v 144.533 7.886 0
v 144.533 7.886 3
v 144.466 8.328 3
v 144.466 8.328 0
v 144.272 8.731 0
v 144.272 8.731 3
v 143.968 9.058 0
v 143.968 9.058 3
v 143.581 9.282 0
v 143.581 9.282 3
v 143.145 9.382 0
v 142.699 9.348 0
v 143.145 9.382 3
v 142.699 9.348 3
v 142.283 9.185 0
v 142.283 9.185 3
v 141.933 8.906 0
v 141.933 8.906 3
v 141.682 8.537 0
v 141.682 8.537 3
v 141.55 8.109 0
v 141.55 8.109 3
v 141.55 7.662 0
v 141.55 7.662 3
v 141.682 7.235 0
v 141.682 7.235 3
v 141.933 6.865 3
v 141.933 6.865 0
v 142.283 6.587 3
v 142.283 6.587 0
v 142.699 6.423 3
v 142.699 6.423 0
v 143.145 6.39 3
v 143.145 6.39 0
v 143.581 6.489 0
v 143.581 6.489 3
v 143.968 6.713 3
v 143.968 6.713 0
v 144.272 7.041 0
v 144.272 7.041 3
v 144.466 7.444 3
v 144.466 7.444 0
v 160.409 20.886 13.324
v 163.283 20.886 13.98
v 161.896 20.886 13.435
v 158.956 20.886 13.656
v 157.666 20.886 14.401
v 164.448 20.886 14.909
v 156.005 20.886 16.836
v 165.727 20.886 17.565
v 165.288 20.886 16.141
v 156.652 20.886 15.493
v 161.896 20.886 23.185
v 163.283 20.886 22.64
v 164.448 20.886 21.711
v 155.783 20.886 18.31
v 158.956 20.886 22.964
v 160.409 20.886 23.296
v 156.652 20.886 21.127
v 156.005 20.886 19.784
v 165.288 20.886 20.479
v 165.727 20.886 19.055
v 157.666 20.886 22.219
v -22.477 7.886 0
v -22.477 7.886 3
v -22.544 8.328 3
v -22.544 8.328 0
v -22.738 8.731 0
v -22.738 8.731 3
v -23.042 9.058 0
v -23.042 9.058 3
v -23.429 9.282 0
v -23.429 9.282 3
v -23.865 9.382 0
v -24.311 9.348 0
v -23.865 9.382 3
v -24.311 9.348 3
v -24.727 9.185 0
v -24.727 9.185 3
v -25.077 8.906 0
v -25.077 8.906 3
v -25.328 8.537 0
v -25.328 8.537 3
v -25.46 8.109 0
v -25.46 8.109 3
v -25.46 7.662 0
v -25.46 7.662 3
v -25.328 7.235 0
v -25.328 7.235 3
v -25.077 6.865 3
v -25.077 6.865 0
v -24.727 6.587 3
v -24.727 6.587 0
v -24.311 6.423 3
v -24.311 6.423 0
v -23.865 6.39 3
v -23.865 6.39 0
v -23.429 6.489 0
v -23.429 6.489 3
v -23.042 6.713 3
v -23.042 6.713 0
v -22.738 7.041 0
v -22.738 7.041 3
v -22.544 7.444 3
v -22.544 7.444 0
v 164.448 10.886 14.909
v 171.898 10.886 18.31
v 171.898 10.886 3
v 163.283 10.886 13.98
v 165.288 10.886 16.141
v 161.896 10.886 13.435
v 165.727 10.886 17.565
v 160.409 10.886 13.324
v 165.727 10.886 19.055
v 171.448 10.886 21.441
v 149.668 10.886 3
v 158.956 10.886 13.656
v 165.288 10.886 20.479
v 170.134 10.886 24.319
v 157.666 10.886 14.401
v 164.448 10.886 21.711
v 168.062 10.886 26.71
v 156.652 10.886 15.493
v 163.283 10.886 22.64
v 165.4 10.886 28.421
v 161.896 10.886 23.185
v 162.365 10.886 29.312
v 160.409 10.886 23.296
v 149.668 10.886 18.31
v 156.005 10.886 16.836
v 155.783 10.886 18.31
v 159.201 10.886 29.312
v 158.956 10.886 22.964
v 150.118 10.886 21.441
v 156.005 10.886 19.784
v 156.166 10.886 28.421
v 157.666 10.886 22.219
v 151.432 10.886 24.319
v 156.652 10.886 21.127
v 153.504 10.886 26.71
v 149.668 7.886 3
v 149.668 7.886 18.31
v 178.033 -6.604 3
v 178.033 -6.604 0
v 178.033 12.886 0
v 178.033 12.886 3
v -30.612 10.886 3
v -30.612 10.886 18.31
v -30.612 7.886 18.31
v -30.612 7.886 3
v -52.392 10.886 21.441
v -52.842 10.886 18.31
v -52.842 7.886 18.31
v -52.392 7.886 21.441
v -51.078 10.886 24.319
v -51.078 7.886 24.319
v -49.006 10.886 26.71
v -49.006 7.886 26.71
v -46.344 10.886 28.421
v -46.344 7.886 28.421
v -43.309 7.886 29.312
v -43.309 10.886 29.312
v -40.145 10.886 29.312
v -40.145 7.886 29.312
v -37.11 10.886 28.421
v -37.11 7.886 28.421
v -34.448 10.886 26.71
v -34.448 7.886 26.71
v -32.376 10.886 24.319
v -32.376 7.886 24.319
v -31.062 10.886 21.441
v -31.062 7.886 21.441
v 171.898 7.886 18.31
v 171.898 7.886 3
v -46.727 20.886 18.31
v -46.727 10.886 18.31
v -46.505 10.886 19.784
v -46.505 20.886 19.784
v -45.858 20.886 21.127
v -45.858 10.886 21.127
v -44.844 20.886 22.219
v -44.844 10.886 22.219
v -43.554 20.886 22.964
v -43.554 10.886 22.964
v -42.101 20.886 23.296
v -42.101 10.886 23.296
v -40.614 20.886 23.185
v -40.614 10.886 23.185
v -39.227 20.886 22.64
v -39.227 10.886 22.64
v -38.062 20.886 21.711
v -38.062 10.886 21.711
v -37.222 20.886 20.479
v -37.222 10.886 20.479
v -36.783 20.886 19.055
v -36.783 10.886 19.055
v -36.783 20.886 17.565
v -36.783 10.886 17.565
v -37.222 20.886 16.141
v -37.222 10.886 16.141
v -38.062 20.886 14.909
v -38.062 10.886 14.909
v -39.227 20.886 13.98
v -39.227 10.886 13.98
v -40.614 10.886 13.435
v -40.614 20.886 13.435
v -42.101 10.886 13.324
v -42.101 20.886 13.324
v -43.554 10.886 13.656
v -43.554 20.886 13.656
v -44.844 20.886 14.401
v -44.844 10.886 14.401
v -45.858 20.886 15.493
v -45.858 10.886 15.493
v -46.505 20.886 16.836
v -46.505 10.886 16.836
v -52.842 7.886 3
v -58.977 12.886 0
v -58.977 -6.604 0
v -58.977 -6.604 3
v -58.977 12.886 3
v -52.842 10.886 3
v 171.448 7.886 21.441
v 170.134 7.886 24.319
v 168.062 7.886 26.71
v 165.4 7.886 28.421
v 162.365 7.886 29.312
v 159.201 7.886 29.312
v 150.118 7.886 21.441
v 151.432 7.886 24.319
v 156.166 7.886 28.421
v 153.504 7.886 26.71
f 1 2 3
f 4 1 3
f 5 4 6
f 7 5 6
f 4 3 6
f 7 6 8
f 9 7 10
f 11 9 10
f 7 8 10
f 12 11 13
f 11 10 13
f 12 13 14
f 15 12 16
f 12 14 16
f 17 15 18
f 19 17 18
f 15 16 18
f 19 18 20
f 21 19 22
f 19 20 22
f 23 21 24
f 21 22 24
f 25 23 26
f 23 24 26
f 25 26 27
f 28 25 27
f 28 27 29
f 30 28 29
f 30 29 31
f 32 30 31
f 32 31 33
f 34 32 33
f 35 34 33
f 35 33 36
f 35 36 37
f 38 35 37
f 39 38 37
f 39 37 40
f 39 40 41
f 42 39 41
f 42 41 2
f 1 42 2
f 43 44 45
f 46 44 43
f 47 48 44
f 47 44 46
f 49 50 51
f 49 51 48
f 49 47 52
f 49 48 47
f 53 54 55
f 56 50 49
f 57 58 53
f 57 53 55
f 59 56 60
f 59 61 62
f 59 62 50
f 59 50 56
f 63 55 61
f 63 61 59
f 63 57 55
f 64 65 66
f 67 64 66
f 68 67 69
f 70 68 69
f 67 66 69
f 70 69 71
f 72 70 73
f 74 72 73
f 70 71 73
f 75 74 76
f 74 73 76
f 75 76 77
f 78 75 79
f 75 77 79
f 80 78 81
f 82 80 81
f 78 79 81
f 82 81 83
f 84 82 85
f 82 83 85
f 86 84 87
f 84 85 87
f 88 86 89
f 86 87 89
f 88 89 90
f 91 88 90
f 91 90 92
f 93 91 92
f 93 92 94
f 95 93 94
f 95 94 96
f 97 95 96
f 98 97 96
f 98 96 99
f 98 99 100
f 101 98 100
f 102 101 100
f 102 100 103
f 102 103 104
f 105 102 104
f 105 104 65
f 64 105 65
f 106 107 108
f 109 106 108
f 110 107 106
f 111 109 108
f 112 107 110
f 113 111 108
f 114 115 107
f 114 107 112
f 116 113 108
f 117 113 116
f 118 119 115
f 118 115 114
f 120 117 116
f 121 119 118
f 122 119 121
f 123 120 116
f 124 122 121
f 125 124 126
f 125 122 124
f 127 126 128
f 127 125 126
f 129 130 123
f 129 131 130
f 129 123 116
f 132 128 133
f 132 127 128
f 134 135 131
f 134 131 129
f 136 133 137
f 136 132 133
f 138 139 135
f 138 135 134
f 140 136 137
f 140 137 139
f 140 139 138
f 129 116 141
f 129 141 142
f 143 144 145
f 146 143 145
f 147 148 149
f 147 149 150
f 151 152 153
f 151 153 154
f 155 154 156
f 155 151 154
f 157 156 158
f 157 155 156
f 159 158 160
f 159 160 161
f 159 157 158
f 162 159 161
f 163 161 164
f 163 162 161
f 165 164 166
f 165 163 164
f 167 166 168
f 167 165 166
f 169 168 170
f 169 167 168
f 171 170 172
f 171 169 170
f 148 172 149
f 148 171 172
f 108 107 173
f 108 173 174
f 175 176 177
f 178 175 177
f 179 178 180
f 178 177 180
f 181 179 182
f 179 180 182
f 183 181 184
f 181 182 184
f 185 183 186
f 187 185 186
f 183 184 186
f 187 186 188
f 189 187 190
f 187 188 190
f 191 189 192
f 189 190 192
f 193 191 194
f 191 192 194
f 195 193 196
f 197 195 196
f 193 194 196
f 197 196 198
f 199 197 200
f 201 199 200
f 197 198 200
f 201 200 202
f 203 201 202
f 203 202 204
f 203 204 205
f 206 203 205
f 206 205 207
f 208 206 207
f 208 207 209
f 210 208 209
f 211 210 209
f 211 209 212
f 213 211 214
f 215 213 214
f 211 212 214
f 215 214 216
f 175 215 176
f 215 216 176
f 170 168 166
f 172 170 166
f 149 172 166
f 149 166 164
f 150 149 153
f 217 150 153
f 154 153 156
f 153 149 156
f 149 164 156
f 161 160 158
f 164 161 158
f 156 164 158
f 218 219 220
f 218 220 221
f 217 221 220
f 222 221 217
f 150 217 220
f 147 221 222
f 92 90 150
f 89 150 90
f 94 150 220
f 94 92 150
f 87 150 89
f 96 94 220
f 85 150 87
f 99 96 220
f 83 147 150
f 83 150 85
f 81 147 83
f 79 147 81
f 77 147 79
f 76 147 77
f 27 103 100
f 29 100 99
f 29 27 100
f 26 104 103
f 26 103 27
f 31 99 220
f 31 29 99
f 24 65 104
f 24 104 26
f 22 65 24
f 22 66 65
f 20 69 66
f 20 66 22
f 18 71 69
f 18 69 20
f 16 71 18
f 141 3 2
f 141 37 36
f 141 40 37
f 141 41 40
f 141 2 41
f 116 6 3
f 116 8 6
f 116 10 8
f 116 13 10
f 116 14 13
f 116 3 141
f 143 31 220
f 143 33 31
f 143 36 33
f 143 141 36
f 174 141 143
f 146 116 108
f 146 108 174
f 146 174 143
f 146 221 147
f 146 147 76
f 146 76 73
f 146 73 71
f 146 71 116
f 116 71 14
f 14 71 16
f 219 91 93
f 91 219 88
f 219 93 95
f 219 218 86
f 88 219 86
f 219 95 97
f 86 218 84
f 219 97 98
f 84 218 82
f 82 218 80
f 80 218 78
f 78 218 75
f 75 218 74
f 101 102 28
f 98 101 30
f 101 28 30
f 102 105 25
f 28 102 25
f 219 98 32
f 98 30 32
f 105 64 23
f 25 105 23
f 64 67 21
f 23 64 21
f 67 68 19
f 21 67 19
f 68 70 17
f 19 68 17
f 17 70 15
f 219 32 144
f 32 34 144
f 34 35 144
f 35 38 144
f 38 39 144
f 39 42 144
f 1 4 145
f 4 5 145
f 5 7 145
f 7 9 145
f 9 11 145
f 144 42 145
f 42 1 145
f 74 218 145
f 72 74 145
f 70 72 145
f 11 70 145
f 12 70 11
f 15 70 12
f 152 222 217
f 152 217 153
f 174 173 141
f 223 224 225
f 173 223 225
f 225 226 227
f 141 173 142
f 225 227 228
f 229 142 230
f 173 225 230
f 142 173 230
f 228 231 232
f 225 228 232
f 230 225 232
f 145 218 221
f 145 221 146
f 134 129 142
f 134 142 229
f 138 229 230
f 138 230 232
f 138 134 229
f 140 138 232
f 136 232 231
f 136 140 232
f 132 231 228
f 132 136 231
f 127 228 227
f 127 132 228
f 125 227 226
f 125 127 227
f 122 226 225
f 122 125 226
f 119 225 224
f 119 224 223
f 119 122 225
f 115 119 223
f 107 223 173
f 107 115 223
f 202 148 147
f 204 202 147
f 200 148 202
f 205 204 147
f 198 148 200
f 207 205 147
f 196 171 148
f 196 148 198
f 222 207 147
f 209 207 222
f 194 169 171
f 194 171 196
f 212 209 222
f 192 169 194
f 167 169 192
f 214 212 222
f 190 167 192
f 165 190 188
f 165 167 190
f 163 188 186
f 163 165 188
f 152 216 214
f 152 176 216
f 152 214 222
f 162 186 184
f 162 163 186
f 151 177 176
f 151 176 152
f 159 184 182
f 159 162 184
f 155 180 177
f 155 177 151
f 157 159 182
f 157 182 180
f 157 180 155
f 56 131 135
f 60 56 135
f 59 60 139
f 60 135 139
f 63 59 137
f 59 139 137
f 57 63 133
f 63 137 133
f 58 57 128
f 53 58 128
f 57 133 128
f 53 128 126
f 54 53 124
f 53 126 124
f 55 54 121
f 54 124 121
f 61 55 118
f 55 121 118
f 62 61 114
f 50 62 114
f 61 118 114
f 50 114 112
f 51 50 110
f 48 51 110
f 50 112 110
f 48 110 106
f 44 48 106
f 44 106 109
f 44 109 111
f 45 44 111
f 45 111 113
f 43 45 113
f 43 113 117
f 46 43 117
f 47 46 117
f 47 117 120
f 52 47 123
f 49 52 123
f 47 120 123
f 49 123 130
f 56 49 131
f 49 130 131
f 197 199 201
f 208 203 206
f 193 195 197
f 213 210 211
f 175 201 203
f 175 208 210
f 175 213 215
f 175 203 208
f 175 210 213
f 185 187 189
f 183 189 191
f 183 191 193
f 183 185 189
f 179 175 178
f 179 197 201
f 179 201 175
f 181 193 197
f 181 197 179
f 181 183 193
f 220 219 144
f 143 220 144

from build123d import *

# Parameters (mm, degrees)
ESQUISSE1_W             = 237.01
ESQUISSE1_H             = 19.49
BOSS_EXTRU_1_DEPTH      = 3
BOSS_EXTRU_2_DEPTH      = 3
ESQUISSE3_R             = 5
BOSS_EXTRU_3_DEPTH      = 10
ESQUISSE4_R             = 5
BOSS_EXTRU_4_DEPTH      = 10
ESQUISSE5_R             = 1.5
ENL_V_MAT_EXTRU_1_DEPTH = 10


with BuildPart() as part:
    # Esquisse1 → Boss.-Extru.1 (new body)
    with BuildSketch(Plane.XY):
        with Locations((59.527989935, 3.140717464)):
            Rectangle(ESQUISSE1_W, ESQUISSE1_H)
    extrude(amount=BOSS_EXTRU_1_DEPTH)

    # Esquisse2 → Boss.-Extru.2 (add)
    with BuildSketch(Plane(origin=(0, 10.885717464, 0), x_dir=(-1, 0, 0), z_dir=(0, 1, 0))):
        with BuildLine():
            Line((52.842010065, 3), (52.842010065, 18.31))
            ThreePointArc((52.842010065, 18.31), (41.727010065, 29.425), (30.612010065, 18.31))
            Line((30.612010065, 18.31), (30.612010065, 3))
            Line((30.612010065, 3), (52.842010065, 3))
        make_face()
        with BuildLine():
            Line((-171.897989935, 3), (-149.667989935, 3))
            Line((-149.667989935, 3), (-149.667989935, 18.31))
            ThreePointArc((-149.667989935, 18.31), (-160.782989935, 29.425), (-171.897989935, 18.31))
            Line((-171.897989935, 18.31), (-171.897989935, 3))
        make_face()
    extrude(amount=-BOSS_EXTRU_2_DEPTH)

    # Esquisse3 → Boss.-Extru.3 (add)
    with BuildSketch(Plane(origin=(0, 10.885717464, 0), x_dir=(-1, 0, 0), z_dir=(0, 1, 0))):
        with Locations((41.727010065, 18.31)):
            Circle(ESQUISSE3_R)
    extrude(amount=BOSS_EXTRU_3_DEPTH)

    # Esquisse4 → Boss.-Extru.4 (add)
    with BuildSketch(Plane(origin=(0, 10.885717464, 0), x_dir=(-1, 0, 0), z_dir=(0, 1, 0))):
        with Locations((-160.782989935, 18.31)):
            Circle(ESQUISSE4_R)
    extrude(amount=BOSS_EXTRU_4_DEPTH)

    # Esquisse5 → Enlèv. mat.-Extru.1 (cut)
    with BuildSketch(Plane.XY.offset(3)):
        with Locations((-23.977010065, 7.885717464)):
            Circle(ESQUISSE5_R)
        with Locations((143.032989935, 7.885717464)):
            Circle(ESQUISSE5_R)
    extrude(amount=-ENL_V_MAT_EXTRU_1_DEPTH, mode=Mode.SUBTRACT)


solid = part.part
